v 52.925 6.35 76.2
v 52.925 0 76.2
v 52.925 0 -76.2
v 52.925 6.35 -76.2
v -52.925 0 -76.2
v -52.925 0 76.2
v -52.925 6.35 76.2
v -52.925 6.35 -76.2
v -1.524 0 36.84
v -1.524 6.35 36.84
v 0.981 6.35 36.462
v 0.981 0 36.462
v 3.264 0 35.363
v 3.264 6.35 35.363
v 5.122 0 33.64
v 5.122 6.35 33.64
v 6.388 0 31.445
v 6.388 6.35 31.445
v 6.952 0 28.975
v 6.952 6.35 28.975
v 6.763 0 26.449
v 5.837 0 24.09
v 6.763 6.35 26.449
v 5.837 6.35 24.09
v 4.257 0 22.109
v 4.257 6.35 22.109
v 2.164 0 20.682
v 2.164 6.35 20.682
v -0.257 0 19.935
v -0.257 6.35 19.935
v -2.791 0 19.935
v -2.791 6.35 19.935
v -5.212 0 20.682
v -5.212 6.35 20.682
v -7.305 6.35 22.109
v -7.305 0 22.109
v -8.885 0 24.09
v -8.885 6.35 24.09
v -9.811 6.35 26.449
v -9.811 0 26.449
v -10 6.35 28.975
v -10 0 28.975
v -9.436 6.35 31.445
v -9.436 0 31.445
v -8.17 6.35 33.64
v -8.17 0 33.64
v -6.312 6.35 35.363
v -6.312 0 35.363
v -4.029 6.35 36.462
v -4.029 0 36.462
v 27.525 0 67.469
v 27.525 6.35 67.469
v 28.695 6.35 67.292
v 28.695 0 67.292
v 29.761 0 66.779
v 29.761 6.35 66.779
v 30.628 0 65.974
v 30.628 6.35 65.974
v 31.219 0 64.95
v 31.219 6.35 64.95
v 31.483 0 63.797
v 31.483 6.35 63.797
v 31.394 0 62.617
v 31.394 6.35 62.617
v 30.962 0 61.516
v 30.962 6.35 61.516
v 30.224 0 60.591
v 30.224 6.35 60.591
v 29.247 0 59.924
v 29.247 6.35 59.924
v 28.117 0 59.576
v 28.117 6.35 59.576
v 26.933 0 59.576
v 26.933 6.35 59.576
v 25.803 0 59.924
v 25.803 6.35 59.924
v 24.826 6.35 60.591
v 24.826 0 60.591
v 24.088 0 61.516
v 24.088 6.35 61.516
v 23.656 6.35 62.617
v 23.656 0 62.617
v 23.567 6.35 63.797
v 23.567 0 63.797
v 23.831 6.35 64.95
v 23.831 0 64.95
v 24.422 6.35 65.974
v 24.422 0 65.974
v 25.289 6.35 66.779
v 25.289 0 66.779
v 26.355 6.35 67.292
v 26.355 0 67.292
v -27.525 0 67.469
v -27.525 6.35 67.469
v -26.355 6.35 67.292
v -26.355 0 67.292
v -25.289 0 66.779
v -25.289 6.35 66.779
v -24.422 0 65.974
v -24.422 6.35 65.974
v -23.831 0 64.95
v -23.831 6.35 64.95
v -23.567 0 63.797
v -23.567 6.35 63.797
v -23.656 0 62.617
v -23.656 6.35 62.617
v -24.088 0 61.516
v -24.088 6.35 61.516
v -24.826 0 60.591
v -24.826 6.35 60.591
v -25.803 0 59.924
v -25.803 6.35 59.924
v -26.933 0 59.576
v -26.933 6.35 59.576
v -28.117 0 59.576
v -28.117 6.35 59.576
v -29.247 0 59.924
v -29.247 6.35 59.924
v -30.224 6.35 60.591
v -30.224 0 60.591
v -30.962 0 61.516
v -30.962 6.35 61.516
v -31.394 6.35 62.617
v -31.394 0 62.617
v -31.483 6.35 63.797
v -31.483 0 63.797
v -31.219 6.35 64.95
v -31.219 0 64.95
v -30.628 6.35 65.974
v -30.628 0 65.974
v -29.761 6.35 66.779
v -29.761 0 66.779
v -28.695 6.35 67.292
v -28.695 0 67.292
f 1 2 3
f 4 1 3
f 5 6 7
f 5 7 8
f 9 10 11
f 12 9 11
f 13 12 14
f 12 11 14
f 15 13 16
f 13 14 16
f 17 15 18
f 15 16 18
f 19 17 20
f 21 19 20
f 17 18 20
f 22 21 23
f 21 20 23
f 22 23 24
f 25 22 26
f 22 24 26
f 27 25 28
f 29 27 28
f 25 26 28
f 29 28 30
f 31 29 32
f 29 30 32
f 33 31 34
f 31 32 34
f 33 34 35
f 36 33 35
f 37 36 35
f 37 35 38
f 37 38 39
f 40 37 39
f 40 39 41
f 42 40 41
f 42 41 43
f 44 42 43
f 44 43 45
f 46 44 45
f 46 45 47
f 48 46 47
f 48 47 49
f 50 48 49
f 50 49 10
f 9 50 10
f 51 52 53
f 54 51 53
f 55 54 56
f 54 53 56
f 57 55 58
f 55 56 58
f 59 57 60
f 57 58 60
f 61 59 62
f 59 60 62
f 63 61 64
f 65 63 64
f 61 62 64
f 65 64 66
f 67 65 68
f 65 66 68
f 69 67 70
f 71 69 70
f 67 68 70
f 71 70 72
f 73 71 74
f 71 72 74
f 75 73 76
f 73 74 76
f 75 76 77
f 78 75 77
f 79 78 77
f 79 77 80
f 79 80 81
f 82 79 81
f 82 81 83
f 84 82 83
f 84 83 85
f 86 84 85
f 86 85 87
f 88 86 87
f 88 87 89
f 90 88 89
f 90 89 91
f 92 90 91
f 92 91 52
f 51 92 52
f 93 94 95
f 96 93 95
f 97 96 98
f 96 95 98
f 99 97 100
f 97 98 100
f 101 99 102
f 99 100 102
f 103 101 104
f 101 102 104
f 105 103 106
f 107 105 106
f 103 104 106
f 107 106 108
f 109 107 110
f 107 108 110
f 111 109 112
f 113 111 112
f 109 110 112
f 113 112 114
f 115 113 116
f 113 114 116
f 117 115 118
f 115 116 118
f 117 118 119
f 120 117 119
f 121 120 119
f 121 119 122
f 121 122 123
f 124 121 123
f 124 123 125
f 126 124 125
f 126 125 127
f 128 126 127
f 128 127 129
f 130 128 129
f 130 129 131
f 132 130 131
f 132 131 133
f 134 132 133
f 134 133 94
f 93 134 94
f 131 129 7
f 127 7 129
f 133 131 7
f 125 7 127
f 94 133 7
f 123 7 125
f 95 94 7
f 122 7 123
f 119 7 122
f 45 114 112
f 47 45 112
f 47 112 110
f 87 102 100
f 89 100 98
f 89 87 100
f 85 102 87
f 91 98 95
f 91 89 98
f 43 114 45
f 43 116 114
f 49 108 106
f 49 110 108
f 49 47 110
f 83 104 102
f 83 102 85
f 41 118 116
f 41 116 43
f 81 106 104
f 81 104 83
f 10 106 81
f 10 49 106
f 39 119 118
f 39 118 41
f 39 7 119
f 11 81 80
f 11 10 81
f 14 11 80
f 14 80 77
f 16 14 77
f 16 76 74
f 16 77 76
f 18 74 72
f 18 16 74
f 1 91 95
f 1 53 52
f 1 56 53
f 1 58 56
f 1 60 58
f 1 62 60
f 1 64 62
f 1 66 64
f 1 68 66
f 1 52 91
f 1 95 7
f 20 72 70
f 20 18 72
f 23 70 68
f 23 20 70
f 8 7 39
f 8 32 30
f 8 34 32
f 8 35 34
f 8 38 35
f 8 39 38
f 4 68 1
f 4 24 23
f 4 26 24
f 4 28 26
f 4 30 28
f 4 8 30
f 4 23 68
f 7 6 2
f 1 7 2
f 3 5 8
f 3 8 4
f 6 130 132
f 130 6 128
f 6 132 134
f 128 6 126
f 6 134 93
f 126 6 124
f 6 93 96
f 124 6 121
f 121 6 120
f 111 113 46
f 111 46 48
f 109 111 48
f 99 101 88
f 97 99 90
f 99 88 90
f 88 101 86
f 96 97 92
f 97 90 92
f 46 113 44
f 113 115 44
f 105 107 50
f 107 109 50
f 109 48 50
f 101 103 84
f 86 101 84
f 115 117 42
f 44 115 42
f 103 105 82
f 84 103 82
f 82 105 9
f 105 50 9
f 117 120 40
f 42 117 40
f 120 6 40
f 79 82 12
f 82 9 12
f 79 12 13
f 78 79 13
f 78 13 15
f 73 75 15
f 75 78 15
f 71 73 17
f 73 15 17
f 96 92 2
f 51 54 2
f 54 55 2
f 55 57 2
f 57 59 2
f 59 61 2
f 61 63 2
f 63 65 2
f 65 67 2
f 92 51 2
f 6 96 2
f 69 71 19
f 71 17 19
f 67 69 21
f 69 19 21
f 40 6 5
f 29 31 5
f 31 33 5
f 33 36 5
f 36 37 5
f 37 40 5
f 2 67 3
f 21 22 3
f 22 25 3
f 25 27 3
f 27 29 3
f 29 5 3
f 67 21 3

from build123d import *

# Parameters (mm, degrees)
SKETCH1_W           = 105.849999898
SKETCH1_H           = 152.4
BOSS_EXTRUDE1_DEPTH = 6.35
CUT_EXTRUDE1_REACH  = 94.994
SKETCH2_R           = 3.96875
SKETCH2_R_2         = 8.5


with BuildPart() as part:
    # Sketch1 → Boss-Extrude1 (new body)
    with BuildSketch(Plane(origin=(0, 0, 0), x_dir=(1, 0, 0), z_dir=(0, 1, 0))):
        Rectangle(SKETCH1_W, SKETCH1_H)
    extrude(amount=BOSS_EXTRUDE1_DEPTH)

    # Sketch2 → Cut-Extrude1 (cut, up to next)
    with BuildSketch(Plane(origin=(0, 6.35, 0), x_dir=(1, 0, 0), z_dir=(0, 1, 0)), mode=Mode.PRIVATE) as cut_extrude1_sk1:
        with Locations(Location((-27.524999949, -63.5, 0), (0, 0, 270))):
            Circle(SKETCH2_R)
    cut_extrude1_tool1 = extrude(cut_extrude1_sk1.sketch, amount=-CUT_EXTRUDE1_REACH, mode=Mode.PRIVATE) & part.part
    # Sketch2 → Cut-Extrude1 (cut, up to next)
    with BuildSketch(Plane(origin=(0, 6.35, 0), x_dir=(1, 0, 0), z_dir=(0, 1, 0)), mode=Mode.PRIVATE) as cut_extrude1_sk2:
        with Locations(Location((27.524999949, -63.5, 0), (0, 0, 270))):
            Circle(SKETCH2_R)
    cut_extrude1_tool2 = extrude(cut_extrude1_sk2.sketch, amount=-CUT_EXTRUDE1_REACH, mode=Mode.PRIVATE) & part.part
    # Sketch2 → Cut-Extrude1 (cut, up to next)
    with BuildSketch(Plane(origin=(0, 6.35, 0), x_dir=(1, 0, 0), z_dir=(0, 1, 0)), mode=Mode.PRIVATE) as cut_extrude1_sk3:
        with Locations(Location((-1.523999881, -28.34, 0), (0, 0, 270))):
            Circle(SKETCH2_R_2)
    cut_extrude1_tool3 = extrude(cut_extrude1_sk3.sketch, amount=-CUT_EXTRUDE1_REACH, mode=Mode.PRIVATE) & part.part
    add(cut_extrude1_tool1.solids().sort_by_distance((-27.525, 6.35, 63.5))[0], mode=Mode.SUBTRACT)
    add(cut_extrude1_tool2.solids().sort_by_distance((27.525, 6.35, 63.5))[0], mode=Mode.SUBTRACT)
    add(cut_extrude1_tool3.solids().sort_by_distance((-1.524, 6.35, 28.34))[0], mode=Mode.SUBTRACT)


solid = part.part
